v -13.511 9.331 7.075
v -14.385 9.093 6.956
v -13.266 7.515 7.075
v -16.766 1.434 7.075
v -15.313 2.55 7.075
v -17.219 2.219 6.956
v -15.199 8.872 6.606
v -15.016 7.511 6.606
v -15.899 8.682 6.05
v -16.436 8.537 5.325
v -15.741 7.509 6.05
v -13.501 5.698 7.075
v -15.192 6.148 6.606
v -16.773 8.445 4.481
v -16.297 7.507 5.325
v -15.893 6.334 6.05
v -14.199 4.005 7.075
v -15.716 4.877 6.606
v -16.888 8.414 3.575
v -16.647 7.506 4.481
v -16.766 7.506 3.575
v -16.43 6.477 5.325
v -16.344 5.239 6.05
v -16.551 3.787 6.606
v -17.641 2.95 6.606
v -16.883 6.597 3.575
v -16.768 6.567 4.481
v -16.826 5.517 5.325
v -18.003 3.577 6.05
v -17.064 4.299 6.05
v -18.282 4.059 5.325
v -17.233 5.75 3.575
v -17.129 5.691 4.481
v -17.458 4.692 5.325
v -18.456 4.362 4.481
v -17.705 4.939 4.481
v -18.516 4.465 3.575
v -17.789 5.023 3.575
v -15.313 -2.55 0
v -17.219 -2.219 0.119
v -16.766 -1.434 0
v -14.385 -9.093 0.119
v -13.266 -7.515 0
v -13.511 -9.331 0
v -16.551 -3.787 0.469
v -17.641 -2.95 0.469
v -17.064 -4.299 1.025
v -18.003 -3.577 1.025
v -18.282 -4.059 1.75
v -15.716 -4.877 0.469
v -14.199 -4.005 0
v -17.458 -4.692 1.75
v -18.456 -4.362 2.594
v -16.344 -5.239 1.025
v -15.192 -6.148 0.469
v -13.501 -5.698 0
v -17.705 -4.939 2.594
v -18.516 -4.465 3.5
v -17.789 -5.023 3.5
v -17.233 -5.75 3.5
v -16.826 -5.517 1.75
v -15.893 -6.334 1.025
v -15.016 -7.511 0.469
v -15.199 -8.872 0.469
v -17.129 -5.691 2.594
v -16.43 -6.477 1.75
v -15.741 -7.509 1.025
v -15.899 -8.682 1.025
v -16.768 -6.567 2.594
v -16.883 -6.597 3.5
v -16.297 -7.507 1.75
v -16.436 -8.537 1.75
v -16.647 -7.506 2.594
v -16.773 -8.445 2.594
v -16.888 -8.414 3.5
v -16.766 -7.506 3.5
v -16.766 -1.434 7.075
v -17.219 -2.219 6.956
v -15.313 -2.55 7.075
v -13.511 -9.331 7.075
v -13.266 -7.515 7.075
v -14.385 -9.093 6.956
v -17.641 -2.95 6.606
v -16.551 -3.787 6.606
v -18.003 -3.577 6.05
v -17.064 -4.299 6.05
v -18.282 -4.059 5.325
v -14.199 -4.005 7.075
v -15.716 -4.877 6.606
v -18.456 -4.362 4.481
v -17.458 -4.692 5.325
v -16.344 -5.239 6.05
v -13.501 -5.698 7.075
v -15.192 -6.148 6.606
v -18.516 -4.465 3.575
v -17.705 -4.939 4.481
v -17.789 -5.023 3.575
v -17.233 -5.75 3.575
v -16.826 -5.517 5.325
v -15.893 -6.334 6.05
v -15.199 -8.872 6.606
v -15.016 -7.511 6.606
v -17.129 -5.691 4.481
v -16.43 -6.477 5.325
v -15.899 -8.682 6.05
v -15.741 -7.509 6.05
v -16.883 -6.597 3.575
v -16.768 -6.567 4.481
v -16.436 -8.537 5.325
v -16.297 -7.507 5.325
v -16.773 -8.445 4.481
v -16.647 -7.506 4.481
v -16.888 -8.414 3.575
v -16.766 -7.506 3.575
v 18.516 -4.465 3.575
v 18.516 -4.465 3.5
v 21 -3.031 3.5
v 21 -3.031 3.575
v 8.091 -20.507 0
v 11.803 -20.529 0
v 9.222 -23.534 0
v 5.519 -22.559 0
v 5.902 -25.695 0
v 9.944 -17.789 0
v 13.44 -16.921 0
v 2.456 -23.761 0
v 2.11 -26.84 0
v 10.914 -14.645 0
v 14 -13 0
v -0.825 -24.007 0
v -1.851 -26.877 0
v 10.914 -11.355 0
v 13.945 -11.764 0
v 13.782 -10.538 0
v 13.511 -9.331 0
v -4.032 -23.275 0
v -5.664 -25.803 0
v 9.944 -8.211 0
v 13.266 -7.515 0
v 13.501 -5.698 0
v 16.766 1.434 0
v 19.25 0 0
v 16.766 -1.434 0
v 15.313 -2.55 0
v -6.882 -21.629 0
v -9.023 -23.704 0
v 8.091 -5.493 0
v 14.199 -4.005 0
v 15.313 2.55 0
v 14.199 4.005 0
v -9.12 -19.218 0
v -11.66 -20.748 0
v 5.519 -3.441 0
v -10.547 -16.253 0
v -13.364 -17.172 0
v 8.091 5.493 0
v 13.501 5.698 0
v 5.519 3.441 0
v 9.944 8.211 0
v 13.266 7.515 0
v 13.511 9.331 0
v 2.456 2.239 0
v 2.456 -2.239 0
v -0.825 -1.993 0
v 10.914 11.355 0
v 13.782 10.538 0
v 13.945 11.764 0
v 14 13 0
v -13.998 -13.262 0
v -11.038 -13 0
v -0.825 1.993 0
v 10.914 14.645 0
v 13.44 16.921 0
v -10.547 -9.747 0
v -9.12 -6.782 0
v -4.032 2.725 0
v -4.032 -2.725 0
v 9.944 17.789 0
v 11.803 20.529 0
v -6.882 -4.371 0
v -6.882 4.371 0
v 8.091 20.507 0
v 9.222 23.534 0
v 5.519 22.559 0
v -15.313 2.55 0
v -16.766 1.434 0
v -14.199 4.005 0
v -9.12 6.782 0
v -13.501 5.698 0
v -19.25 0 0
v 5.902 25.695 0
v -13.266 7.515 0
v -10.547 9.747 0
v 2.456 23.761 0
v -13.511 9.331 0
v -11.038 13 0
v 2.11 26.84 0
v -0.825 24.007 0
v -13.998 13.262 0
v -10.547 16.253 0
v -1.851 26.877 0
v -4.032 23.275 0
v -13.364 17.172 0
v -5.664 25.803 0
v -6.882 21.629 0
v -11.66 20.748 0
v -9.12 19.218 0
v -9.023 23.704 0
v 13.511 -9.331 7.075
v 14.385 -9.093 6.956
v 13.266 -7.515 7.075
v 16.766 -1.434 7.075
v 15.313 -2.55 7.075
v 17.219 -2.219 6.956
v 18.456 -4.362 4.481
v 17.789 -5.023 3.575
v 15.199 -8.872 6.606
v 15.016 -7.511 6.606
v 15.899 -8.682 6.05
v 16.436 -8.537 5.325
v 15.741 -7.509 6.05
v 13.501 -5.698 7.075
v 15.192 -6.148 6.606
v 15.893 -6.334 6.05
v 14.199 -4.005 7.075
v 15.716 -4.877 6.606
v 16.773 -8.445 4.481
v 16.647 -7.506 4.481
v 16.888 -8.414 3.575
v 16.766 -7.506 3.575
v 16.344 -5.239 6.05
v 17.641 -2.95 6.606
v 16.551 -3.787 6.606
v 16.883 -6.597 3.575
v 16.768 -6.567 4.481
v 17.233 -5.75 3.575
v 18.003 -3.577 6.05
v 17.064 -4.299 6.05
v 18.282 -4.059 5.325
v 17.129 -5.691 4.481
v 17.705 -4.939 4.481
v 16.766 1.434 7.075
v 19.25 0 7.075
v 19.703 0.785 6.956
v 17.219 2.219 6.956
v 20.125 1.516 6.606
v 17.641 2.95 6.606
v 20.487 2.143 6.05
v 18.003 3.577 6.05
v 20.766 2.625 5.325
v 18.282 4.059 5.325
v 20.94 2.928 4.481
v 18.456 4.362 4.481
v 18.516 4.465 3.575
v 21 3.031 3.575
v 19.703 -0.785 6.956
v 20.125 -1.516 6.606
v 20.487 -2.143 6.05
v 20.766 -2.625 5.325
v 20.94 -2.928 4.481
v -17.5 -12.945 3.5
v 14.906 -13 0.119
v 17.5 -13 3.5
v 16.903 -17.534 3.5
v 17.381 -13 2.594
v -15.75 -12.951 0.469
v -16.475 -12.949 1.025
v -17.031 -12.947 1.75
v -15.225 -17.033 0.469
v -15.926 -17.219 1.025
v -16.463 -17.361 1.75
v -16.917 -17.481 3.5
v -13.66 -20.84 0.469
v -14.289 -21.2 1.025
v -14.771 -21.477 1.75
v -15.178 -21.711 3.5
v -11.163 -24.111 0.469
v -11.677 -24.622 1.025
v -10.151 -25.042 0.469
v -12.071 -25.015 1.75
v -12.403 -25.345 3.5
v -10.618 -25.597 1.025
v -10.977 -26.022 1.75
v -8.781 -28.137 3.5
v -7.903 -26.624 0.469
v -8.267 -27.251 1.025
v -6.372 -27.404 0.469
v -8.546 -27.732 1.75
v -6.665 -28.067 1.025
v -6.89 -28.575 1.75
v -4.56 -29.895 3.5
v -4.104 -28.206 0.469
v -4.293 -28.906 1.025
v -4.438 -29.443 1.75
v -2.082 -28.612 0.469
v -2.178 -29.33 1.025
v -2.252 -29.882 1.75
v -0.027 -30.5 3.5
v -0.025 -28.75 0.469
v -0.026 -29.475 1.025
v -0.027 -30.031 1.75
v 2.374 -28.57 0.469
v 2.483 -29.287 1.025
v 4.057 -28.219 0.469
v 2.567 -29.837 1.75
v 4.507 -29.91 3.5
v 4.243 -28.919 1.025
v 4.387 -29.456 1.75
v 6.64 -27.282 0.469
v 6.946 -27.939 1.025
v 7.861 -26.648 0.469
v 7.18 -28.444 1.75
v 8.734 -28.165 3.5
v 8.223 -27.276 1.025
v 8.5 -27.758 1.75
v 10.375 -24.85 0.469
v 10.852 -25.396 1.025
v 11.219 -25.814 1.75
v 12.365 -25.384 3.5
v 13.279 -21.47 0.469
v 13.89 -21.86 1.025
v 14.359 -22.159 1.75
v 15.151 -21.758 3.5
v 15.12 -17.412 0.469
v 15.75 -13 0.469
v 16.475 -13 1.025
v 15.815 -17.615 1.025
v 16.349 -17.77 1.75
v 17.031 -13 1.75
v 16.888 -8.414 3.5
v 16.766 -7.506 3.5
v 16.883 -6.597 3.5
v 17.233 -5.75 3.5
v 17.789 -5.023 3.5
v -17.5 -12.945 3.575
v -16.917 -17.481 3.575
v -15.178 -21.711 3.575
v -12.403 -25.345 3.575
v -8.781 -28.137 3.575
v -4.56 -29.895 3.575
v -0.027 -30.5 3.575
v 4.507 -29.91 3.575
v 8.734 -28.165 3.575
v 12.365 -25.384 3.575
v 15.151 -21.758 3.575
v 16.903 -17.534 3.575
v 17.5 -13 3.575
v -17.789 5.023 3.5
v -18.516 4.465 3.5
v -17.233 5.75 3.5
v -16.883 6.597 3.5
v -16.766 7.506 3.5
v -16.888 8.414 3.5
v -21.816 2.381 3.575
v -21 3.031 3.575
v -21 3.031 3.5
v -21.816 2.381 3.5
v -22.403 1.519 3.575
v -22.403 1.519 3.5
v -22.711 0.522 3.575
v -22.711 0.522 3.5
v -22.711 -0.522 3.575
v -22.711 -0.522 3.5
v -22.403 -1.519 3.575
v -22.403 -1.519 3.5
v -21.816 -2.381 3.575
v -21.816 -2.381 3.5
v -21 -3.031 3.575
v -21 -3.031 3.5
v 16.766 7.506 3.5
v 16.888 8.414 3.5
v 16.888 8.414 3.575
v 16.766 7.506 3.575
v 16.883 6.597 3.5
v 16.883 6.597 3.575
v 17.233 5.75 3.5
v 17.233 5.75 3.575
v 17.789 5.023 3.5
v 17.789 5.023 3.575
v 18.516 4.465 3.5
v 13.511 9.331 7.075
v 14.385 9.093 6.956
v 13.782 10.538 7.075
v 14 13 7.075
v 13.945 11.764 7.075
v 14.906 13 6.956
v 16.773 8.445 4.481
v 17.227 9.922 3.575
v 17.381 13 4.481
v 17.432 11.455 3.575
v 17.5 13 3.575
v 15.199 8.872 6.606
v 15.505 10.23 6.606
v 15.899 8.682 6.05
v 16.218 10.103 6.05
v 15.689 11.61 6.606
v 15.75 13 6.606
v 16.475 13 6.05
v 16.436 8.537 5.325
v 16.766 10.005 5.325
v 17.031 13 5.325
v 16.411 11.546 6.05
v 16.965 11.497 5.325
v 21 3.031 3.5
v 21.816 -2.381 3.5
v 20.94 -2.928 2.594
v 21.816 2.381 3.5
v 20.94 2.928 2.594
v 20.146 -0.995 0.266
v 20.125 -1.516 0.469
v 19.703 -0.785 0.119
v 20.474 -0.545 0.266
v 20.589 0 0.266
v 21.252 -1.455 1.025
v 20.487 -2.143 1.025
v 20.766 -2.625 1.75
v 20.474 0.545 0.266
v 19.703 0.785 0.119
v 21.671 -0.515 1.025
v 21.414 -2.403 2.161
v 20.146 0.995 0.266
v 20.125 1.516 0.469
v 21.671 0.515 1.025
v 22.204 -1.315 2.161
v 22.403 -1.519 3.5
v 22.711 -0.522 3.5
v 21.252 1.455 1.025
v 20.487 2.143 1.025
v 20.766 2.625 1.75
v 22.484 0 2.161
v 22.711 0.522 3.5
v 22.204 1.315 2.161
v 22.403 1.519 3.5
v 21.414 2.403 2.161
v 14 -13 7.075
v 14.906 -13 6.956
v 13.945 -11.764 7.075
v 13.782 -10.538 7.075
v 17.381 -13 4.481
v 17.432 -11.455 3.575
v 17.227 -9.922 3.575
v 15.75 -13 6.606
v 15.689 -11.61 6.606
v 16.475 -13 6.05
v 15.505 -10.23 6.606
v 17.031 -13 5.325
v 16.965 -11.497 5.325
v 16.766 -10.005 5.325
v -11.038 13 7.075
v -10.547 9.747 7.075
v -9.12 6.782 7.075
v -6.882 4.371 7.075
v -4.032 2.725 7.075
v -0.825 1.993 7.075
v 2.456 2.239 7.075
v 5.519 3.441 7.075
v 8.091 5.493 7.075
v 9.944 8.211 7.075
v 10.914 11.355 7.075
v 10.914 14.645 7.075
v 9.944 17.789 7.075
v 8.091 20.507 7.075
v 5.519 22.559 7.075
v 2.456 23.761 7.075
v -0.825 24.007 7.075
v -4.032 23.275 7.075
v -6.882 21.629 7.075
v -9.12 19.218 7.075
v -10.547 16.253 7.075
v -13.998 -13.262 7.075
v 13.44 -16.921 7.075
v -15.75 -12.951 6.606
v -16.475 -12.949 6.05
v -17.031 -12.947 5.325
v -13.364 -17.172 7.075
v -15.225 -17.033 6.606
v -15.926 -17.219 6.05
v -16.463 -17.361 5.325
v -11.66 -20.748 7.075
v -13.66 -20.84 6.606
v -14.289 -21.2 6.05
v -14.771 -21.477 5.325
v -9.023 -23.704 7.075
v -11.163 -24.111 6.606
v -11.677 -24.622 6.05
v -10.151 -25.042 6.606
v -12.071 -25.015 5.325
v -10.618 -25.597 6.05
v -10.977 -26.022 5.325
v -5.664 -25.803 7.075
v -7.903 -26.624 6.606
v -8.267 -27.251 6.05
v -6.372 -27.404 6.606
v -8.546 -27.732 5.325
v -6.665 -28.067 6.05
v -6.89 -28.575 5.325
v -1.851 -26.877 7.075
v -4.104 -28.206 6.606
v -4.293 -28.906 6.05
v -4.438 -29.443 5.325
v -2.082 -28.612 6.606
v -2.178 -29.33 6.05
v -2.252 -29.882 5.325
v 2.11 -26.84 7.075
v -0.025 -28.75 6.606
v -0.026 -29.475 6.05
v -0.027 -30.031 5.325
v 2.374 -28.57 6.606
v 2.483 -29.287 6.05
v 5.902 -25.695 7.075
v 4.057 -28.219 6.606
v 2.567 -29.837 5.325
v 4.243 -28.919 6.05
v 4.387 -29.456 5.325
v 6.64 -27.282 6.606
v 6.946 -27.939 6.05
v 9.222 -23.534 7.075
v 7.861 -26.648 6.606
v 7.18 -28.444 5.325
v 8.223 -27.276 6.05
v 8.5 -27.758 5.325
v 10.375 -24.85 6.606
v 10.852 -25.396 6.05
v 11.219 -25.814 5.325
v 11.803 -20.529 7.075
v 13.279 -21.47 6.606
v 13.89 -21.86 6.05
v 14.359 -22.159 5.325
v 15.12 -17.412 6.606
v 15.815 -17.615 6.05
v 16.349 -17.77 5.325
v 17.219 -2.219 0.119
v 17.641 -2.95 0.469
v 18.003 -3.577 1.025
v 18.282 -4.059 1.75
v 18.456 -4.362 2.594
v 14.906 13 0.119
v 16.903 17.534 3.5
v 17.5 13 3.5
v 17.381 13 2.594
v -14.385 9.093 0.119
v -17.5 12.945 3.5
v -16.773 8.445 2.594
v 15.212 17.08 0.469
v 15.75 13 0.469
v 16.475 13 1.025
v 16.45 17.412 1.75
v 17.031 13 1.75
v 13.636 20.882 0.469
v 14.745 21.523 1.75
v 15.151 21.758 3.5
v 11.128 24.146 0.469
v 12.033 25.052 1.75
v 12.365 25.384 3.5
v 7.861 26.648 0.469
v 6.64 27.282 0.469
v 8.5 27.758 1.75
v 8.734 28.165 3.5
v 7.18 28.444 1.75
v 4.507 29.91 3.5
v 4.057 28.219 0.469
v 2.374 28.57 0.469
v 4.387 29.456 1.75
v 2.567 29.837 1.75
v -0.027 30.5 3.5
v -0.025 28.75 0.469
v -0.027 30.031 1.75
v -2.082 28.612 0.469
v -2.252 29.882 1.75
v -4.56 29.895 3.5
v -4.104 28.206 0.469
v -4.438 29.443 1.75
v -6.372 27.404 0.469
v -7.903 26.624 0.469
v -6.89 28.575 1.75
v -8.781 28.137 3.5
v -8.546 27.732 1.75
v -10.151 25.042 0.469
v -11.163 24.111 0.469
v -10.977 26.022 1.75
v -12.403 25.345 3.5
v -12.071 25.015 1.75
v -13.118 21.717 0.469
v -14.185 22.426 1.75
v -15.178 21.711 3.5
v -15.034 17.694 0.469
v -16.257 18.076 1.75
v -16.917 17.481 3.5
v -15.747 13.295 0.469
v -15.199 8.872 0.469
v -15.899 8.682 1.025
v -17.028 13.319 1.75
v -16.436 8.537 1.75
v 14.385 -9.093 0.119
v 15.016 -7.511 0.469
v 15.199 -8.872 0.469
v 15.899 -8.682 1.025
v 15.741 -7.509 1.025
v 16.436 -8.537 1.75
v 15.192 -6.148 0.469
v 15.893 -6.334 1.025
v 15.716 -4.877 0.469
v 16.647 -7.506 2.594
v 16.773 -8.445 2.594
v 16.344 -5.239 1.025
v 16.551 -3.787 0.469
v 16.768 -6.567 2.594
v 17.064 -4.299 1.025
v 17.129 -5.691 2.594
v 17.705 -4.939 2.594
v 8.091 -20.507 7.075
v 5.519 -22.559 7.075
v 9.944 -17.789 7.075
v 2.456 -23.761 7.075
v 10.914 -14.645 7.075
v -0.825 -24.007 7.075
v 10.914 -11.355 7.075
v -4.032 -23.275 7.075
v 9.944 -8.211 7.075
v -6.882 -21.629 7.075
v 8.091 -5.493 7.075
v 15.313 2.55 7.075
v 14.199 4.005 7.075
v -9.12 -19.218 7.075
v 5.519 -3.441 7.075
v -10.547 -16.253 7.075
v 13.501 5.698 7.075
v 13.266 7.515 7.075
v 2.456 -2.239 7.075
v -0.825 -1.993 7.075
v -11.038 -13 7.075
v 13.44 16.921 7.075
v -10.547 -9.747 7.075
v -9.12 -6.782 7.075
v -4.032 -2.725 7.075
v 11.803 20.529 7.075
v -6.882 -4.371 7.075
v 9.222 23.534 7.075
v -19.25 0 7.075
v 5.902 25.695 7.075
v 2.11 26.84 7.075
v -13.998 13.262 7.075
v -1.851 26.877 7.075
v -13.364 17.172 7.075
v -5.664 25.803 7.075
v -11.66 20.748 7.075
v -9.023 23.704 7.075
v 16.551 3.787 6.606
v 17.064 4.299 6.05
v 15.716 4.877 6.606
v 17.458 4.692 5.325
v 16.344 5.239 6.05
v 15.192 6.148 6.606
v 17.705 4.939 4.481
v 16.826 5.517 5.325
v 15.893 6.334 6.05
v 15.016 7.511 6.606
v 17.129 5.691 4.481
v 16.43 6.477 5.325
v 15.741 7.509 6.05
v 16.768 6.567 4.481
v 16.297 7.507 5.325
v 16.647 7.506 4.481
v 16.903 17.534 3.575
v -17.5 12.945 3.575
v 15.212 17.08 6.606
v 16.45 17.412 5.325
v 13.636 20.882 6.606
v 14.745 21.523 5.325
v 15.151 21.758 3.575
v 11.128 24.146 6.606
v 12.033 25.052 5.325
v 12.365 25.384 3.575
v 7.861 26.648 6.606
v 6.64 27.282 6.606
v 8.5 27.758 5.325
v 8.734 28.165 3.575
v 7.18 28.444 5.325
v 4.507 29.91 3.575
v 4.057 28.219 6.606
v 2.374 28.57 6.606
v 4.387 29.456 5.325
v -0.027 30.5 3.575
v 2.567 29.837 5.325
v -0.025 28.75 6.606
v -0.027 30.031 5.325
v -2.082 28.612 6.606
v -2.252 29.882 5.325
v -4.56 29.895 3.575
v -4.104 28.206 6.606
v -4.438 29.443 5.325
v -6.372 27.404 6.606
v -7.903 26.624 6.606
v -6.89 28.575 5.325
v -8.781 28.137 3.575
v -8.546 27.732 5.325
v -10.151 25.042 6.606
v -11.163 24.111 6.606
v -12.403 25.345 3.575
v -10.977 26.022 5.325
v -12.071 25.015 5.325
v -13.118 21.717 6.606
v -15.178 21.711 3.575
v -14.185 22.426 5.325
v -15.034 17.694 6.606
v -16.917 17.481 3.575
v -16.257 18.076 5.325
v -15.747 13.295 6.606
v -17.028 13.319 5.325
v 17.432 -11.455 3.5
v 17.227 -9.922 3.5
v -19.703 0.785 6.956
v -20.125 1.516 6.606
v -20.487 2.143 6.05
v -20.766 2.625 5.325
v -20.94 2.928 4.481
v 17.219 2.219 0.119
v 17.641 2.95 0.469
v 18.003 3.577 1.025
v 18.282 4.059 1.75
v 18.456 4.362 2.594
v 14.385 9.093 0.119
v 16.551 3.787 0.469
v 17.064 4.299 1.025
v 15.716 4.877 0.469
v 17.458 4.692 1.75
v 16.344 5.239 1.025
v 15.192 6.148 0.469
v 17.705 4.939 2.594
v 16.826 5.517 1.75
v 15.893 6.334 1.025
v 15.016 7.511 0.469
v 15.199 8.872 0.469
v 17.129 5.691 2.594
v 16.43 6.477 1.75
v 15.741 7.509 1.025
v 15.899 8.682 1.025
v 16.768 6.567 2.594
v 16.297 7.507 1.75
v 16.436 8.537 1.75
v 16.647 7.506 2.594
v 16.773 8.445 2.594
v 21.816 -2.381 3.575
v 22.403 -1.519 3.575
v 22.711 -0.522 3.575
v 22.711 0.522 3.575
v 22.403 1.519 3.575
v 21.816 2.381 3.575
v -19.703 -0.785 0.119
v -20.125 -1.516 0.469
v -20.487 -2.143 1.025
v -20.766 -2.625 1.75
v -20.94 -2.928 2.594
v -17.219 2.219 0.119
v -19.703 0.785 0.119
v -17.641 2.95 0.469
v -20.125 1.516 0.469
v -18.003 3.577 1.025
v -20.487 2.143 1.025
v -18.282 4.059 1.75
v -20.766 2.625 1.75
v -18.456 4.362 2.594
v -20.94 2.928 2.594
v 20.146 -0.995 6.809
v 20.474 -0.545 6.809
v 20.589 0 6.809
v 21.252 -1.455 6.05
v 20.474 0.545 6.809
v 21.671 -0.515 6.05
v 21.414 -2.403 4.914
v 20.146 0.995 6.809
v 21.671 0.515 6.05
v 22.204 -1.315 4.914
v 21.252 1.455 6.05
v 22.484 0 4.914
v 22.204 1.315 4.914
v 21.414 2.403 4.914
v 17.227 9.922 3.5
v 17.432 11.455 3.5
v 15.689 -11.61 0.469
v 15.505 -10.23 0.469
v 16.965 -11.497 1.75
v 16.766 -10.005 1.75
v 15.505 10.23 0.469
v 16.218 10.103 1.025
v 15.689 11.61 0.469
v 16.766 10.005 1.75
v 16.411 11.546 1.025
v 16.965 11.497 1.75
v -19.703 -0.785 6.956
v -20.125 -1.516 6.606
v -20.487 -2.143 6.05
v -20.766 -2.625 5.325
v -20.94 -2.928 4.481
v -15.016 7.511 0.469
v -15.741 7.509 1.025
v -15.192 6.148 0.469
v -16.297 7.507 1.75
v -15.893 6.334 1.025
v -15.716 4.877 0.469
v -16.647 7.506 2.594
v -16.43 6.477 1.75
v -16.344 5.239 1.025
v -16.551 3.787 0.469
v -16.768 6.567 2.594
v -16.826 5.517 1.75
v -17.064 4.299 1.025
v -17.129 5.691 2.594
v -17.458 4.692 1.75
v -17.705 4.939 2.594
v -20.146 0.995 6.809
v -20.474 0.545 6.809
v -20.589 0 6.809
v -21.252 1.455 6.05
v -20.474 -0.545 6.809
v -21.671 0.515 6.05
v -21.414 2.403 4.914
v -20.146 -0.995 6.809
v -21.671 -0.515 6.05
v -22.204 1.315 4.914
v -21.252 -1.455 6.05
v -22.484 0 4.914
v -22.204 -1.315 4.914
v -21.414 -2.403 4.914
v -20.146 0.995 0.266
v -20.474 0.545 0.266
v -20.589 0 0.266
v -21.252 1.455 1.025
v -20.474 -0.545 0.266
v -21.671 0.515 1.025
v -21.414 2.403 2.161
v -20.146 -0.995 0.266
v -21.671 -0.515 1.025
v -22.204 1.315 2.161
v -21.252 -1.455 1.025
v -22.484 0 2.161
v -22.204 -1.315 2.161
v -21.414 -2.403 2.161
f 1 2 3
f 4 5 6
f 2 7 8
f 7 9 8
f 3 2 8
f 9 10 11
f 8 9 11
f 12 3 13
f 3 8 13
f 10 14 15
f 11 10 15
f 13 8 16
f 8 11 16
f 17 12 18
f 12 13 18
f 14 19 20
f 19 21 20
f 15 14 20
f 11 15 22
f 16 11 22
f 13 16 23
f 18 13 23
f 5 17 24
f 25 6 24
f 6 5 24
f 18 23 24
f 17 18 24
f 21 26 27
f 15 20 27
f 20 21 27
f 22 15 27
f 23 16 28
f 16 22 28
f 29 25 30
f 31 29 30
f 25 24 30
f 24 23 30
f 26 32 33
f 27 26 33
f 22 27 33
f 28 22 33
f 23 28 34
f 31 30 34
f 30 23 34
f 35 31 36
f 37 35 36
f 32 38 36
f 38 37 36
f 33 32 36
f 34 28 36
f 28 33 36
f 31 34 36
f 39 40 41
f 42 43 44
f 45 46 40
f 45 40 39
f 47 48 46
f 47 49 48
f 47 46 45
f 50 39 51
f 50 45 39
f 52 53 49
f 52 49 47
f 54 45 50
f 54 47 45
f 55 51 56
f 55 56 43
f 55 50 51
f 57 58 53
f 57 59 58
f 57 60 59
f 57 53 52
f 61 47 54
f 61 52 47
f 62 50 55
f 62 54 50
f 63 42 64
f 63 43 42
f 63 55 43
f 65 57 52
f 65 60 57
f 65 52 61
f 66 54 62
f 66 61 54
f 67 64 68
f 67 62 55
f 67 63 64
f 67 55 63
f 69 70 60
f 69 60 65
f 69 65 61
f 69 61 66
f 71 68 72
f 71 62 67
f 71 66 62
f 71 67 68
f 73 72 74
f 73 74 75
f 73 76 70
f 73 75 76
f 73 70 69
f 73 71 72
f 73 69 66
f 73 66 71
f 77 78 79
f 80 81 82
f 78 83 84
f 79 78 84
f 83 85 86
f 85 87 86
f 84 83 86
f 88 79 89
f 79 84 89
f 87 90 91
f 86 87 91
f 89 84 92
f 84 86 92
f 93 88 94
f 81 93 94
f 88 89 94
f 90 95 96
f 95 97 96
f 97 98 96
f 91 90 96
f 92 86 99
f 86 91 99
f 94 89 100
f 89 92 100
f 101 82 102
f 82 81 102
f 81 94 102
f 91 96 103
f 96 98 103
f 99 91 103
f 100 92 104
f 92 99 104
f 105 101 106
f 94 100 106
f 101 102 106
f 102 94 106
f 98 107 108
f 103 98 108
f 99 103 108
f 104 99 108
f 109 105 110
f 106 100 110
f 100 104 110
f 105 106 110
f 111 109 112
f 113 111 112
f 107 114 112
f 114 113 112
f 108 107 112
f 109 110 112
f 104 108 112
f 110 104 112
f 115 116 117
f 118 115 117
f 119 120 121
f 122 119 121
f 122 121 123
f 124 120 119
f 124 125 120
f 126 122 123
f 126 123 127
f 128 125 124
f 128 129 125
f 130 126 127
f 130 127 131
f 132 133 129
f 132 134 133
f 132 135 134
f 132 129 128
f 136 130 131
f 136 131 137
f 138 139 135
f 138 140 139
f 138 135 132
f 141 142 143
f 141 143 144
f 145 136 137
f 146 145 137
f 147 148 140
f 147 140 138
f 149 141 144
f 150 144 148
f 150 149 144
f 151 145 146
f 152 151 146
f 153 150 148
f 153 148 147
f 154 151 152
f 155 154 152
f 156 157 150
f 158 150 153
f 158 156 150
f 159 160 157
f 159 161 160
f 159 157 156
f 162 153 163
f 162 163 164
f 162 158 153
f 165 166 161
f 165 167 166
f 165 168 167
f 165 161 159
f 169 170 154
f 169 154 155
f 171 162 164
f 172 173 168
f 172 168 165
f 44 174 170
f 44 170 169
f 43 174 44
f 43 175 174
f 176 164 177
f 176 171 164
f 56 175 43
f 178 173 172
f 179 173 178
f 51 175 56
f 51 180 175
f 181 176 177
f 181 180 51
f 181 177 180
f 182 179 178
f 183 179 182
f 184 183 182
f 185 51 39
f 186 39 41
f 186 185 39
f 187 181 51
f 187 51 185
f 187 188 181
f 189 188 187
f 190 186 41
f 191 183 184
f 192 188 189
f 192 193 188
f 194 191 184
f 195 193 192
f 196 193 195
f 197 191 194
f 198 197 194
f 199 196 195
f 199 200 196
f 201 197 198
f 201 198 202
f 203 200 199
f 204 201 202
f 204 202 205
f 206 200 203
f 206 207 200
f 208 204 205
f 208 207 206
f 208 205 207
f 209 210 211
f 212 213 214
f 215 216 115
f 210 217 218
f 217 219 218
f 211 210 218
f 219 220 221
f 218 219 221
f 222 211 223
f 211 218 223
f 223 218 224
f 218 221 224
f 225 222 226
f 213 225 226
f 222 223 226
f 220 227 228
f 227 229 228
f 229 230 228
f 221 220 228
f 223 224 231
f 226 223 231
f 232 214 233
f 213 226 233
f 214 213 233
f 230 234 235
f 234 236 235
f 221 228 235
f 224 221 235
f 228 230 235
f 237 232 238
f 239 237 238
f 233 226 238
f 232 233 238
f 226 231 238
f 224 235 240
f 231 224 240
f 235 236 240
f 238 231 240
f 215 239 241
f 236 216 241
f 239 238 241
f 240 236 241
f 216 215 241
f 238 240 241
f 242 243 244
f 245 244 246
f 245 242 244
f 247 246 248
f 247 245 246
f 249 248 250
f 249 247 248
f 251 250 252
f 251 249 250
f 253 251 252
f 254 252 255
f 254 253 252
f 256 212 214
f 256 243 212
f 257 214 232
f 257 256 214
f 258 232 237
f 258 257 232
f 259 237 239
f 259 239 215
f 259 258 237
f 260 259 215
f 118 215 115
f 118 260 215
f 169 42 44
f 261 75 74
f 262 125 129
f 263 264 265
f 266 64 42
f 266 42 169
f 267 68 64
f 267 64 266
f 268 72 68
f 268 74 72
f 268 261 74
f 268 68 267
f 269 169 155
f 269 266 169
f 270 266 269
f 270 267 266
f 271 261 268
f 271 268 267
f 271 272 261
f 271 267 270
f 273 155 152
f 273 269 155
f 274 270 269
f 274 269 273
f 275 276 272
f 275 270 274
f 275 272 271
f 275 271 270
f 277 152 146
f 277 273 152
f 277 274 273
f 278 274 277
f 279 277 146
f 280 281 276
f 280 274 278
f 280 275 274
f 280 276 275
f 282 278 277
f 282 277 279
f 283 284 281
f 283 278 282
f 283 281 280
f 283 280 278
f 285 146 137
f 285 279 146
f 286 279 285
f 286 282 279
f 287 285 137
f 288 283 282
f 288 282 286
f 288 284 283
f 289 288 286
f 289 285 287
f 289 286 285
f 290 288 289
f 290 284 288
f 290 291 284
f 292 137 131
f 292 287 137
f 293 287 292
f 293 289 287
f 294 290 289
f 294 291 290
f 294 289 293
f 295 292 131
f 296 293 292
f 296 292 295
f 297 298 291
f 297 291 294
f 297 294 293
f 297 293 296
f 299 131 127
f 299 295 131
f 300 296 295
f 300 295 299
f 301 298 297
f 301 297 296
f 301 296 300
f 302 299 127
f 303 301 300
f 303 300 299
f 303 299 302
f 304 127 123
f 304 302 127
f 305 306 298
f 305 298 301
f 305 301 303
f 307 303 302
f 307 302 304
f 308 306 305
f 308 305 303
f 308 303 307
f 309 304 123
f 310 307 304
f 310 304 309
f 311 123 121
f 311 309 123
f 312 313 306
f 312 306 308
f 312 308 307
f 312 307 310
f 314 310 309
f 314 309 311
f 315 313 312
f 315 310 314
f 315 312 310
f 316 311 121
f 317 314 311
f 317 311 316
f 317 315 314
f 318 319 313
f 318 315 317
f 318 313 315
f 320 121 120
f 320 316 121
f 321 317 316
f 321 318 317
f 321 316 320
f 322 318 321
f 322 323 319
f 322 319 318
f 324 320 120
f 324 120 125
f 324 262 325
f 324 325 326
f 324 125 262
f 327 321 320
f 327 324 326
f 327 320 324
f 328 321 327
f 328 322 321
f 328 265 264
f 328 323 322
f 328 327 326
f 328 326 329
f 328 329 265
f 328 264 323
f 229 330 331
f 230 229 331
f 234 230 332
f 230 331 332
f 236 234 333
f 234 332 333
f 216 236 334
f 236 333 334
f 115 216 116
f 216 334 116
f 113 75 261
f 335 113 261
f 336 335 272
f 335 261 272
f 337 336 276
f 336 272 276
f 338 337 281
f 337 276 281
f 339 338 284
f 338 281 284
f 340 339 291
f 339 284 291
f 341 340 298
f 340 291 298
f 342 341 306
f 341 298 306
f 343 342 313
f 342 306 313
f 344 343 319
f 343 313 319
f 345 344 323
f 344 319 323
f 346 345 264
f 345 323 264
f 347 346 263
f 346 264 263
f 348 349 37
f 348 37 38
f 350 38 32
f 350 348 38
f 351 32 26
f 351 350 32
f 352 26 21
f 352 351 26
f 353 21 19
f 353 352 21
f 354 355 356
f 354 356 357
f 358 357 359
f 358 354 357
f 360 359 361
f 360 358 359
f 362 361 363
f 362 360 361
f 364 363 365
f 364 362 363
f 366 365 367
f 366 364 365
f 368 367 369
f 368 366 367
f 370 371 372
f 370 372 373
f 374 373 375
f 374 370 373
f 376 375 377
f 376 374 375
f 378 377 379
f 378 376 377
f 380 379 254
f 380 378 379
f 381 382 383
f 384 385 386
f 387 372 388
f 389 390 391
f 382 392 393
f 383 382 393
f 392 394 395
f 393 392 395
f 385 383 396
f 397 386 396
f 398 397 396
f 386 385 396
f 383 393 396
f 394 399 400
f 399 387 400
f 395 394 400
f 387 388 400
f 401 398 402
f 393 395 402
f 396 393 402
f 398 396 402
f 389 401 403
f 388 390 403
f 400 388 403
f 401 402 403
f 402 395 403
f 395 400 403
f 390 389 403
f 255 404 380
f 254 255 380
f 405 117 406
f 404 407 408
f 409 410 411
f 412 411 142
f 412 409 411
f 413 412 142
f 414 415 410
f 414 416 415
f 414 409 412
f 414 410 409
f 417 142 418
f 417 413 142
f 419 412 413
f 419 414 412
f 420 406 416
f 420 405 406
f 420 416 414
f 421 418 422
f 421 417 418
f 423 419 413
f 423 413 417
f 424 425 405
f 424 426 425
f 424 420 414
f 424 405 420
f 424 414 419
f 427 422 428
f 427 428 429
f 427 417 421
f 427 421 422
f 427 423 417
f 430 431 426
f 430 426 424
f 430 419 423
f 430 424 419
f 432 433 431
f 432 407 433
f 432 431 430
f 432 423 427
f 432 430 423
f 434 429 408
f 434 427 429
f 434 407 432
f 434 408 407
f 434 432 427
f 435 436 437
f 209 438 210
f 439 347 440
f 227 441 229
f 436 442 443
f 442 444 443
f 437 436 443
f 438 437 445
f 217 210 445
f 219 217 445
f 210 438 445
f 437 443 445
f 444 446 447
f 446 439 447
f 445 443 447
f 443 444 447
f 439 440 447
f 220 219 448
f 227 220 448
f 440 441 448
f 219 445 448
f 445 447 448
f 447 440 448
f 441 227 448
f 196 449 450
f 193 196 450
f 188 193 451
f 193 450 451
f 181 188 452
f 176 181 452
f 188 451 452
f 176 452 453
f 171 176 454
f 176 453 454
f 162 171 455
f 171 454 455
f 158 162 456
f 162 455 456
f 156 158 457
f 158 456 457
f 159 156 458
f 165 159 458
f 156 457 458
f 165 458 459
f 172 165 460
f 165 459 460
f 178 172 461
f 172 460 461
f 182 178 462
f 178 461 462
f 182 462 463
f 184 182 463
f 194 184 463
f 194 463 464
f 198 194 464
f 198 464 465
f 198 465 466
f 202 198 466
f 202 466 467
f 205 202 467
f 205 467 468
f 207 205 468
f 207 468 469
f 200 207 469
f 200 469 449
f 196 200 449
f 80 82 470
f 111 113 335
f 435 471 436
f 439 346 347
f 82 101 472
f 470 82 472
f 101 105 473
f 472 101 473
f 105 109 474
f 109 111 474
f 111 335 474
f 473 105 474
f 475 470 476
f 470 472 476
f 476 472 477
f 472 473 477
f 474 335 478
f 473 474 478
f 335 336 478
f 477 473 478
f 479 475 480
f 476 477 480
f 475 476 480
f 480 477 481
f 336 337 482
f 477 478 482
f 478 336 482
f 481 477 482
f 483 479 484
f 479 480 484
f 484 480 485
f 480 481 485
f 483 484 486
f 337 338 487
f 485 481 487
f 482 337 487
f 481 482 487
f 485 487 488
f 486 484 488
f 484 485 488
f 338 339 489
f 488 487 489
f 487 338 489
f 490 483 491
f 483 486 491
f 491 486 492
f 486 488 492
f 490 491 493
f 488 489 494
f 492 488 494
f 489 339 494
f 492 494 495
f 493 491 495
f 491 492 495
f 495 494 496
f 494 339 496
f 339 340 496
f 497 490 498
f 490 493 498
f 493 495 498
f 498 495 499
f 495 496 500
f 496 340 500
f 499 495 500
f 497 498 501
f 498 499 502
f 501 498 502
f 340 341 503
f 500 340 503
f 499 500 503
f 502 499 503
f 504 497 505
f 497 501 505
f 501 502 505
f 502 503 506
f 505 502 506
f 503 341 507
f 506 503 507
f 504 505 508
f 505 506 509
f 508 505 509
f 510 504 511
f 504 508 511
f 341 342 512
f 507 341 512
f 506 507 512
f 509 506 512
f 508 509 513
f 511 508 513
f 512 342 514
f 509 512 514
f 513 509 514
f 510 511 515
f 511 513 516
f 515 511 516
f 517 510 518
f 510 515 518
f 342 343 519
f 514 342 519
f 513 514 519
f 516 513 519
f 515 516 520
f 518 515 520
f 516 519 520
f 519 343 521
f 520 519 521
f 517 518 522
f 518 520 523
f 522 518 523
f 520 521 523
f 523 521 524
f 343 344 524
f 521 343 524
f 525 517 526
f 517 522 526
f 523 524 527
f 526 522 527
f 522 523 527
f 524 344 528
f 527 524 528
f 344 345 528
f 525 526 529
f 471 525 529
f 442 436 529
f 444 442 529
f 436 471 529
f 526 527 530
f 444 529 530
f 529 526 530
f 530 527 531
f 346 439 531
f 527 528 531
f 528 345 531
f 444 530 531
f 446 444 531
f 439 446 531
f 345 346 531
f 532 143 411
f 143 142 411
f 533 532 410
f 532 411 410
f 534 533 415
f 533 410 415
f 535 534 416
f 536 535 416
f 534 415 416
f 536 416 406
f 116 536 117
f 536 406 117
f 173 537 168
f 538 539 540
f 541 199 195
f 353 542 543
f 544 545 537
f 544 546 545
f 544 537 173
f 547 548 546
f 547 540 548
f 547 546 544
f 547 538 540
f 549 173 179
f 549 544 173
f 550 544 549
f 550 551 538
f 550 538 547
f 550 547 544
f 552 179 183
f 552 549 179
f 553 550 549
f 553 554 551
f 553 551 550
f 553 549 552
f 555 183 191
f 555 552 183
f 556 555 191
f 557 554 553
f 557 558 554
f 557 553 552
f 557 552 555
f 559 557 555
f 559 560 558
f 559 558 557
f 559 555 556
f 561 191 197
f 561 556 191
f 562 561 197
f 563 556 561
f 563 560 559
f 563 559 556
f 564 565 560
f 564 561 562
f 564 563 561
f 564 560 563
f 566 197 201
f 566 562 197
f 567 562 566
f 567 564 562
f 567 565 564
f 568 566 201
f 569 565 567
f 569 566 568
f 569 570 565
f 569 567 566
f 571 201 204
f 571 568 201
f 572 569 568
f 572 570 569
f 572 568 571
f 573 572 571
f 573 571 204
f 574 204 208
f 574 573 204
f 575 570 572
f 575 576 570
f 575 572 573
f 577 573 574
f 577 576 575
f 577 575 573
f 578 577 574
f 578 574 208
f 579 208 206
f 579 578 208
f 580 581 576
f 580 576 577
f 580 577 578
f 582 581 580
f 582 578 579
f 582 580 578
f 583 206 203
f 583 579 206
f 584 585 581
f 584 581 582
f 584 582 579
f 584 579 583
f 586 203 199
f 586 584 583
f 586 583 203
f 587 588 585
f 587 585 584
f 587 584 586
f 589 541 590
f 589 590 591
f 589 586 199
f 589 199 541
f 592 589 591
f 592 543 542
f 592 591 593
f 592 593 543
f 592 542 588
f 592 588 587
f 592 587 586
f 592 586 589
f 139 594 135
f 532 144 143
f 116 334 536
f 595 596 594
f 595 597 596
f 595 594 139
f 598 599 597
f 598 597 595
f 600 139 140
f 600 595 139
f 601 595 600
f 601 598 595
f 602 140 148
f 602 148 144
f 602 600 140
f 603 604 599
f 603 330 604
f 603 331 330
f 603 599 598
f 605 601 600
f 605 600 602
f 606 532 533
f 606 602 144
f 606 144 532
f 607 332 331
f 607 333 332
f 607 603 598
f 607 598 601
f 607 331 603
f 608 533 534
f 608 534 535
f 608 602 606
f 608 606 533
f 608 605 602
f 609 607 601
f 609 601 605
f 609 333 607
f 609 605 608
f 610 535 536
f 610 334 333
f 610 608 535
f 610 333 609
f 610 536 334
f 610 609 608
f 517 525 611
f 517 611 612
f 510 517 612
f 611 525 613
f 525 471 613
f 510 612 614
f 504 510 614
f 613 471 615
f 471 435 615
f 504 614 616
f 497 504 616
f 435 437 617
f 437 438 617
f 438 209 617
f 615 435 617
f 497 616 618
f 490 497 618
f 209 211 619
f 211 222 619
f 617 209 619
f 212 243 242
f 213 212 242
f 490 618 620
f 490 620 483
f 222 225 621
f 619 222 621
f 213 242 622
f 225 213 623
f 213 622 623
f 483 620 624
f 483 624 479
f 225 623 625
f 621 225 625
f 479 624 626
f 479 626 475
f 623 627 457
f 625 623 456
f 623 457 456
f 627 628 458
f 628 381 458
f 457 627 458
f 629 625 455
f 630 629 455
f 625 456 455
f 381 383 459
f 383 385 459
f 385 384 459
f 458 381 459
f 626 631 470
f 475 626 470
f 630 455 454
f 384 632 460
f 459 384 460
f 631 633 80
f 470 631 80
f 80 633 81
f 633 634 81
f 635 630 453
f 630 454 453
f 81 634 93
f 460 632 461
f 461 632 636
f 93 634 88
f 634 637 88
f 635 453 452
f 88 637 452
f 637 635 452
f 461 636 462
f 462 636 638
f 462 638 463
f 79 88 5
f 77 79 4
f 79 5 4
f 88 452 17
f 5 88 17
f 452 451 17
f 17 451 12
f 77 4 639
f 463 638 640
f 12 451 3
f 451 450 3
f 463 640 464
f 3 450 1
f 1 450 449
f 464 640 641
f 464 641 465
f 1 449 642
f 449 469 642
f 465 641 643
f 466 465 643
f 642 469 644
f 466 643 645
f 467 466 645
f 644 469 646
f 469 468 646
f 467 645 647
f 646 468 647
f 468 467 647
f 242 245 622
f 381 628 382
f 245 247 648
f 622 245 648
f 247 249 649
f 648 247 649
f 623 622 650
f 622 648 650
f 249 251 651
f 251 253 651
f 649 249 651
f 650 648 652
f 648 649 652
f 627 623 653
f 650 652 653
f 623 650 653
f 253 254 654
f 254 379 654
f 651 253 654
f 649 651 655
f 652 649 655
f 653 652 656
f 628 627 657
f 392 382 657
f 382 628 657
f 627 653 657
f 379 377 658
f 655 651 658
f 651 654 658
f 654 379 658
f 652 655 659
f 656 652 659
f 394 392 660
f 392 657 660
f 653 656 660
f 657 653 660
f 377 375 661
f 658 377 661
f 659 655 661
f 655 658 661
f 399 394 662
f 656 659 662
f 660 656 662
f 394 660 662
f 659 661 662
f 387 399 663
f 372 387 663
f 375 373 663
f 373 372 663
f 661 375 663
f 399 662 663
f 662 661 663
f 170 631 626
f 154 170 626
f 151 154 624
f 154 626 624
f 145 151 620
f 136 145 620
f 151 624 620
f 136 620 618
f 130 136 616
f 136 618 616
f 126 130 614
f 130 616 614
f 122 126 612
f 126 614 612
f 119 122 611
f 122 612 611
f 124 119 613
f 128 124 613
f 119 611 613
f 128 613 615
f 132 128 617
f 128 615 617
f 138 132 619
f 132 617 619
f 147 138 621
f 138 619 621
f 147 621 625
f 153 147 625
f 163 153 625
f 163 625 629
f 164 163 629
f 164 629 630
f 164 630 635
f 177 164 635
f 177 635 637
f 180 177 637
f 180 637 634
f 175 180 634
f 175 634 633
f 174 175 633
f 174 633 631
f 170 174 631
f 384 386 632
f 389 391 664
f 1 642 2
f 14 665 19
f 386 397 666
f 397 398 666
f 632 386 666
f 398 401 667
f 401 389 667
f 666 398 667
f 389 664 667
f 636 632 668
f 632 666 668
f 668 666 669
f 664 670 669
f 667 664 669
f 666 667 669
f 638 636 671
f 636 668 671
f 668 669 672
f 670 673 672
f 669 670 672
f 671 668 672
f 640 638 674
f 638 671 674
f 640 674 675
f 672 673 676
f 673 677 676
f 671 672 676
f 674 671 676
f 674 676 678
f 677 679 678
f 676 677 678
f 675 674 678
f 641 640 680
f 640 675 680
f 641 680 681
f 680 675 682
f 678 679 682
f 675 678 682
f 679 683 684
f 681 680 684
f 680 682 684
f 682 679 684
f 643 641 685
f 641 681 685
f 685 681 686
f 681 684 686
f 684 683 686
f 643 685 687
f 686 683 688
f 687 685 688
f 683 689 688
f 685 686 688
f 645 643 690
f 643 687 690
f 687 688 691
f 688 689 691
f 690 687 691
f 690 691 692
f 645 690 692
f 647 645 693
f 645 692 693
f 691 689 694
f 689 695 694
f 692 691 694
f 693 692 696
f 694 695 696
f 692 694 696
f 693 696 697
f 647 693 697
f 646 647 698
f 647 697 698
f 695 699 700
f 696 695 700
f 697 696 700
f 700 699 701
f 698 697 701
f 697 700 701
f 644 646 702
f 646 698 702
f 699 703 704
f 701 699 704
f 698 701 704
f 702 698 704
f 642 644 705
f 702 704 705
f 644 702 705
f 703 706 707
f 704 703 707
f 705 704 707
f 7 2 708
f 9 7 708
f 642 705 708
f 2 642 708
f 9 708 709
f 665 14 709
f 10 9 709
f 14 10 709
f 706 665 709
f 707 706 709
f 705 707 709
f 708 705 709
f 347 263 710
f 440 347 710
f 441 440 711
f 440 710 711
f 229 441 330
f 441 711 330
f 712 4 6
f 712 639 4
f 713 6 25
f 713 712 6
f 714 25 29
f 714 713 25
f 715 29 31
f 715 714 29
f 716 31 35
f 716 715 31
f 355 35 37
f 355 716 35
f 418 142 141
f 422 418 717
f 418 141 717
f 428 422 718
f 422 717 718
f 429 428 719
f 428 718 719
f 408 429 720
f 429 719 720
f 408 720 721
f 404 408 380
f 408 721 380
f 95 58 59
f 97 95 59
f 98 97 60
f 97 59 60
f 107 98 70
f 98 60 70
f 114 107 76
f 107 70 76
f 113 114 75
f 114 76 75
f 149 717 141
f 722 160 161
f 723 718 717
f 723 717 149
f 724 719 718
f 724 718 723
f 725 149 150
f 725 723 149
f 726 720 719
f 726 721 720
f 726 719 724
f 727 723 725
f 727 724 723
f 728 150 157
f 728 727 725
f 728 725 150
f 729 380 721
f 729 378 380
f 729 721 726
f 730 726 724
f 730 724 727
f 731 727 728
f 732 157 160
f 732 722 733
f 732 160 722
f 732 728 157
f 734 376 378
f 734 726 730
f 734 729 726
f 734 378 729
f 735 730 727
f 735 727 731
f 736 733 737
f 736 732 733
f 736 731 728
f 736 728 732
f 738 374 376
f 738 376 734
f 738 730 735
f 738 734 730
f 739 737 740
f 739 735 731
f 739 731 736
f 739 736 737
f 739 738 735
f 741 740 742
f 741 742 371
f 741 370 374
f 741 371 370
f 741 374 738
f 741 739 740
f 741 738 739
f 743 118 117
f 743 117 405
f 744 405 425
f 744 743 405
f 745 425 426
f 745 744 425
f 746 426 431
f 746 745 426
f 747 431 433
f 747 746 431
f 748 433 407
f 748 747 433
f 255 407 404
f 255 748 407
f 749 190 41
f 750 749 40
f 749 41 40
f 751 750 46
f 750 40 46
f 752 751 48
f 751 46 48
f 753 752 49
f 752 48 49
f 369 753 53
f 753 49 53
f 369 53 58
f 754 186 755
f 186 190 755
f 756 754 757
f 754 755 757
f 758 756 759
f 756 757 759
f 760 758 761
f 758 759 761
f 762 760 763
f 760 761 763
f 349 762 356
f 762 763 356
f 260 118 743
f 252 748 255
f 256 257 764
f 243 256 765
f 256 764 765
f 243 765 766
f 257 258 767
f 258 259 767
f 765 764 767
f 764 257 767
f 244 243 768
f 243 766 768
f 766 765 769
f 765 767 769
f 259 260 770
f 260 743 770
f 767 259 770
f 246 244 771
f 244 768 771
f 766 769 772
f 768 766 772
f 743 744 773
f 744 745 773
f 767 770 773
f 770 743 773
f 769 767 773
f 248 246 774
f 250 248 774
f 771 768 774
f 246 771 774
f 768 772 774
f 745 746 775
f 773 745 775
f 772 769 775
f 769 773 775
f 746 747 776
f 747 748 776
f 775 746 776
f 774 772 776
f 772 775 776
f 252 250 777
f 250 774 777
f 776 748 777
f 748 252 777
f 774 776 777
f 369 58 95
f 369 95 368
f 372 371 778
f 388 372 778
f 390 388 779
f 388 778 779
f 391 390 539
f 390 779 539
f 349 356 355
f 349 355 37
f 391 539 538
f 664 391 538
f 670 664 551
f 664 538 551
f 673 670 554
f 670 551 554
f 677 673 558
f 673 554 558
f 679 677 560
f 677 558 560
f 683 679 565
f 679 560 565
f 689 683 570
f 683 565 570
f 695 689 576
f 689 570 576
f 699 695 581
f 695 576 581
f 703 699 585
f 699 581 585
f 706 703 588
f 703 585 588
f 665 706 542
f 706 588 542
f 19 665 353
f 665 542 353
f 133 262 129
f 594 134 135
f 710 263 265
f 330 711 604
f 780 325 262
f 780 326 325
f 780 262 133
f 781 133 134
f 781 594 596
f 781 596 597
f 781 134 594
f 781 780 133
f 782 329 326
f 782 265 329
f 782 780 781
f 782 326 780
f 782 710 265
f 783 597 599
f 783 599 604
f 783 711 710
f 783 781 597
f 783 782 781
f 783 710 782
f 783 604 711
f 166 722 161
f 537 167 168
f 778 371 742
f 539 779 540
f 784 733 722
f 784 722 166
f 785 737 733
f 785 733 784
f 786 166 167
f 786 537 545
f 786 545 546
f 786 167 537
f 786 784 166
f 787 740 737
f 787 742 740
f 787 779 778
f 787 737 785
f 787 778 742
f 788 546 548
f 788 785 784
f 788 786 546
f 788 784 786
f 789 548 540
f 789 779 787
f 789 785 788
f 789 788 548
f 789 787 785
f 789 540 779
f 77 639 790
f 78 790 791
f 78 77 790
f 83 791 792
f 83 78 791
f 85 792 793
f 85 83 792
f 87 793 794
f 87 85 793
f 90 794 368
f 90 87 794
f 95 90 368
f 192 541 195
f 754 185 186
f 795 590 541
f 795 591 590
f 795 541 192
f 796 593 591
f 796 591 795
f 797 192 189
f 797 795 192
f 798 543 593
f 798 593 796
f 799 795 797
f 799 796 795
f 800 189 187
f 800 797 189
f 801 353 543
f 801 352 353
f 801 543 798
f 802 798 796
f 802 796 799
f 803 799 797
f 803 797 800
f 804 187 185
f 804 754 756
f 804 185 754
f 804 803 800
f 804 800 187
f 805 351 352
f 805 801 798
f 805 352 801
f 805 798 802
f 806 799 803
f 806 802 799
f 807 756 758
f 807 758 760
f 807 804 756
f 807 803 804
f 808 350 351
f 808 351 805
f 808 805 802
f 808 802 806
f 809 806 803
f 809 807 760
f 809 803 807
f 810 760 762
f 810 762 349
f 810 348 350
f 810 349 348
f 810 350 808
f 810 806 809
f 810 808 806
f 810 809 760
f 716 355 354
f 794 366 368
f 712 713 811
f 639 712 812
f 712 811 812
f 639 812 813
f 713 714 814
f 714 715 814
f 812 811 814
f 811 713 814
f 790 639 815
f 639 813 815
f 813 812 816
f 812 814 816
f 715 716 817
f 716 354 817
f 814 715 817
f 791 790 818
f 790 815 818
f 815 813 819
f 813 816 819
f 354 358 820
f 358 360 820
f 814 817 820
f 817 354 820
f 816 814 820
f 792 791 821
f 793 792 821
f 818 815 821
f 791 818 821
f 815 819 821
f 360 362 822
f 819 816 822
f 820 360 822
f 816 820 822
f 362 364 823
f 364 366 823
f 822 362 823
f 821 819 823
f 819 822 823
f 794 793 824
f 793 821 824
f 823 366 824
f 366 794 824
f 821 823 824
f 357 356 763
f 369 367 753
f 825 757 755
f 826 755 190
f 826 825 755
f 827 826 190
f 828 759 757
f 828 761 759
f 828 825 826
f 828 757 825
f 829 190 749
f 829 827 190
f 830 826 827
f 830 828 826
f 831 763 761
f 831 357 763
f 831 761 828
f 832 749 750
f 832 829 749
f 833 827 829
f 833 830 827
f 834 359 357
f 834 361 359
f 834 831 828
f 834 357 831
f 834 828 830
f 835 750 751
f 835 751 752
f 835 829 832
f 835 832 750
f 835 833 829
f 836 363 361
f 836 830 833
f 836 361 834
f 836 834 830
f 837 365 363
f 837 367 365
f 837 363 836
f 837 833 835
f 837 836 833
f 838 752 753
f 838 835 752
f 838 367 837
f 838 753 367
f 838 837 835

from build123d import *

# Parameters (mm, degrees)
F1_DEPTH = 7.075
F3_DEPTH = 7.075
F4_D     = 22.075
F4_DEPTH = 35.375
F4_TIP   = 6.6319990825
F5_F1_R  = 3.5
F5_F2_R  = 3.5
F5_F3_R  = 3.5


# Not quite as in the source:
# - a pattern or mirror of a feature is missing from the dataset's text; its kind, count and spacing are read off the source's solid


with BuildPart() as f1:
    # F0 (on Top) → F1 (new body)
    with BuildSketch(Plane.XY):
        with BuildLine():
            ThreePointArc((11.7153745139, 0), (15.9885748895, 5.8855447852), (17.5, 13))
            ThreePointArc((17.5, 13), (-7.1144552148, 28.9885748895), (-11.7153745139, 0))
            ThreePointArc((-11.7153745139, 0), (0, 4.5), (11.7153745139, 0))
        make_face()
        with BuildLine():
            ThreePointArc((11.7153745139, 0), (0, -4.5), (-11.7153745139, 0))
            ThreePointArc((-11.7153745139, 0), (-7.1144552148, -28.9885748895), (17.5, -13))
            ThreePointArc((17.5, -13), (15.9885748895, -5.8855447852), (11.7153745139, 0))
        make_face()
        with BuildLine():
            ThreePointArc((11.7153745139, 0), (0, 4.5), (-11.7153745139, 0))
            ThreePointArc((-11.7153745139, 0), (0, -4.5), (11.7153745139, 0))
        make_face()
    extrude(amount=F1_DEPTH)

    # F2 (on Top) → F3 (join)
    with BuildSketch(Plane.XY):
        Polygon((26.25, 0), (0, 15.1554445662), (0, -15.1554445662), align=None)
    f3 = extrude(amount=F3_DEPTH)

    # F3_copies: F3 across plane
    add(f3.mirror(Plane(origin=(0, 0, 0), x_dir=(0, 0, -1), z_dir=(-1, 0, 0))))

    # F4
    with Locations(Plane(origin=(0, 0, 0), x_dir=(1, 0, 0), z_dir=(0, 0, -1))):
        with Locations((0, -13), (0, 13)):
            Hole(F4_D / 2, depth=F4_DEPTH)
            with Locations((0, 0, -(F4_DEPTH + F4_TIP / 2))):  # 118° drill point
                Cone(0, F4_D / 2, F4_TIP, mode=Mode.SUBTRACT)

    # F5: fillet of radius 3.5 on 14 edges, made by hand

    # F5_f1
    f5_f1_edges = [f1.edges().sort_by_distance(p)[0] for p in [
        (16.0023148685, -5.9165037693, 3.5375),
        (-16.0023148685, 5.9165037693, 3.5375),
        (16.0023148685, 5.9165037693, 3.5375),
        (-16.0023148685, -5.9165037693, 3.5375),
    ]]
    fillet(f5_f1_edges, radius=F5_F1_R)

    # F5_f2
    f5_f2_edges = [f1.edges().sort_by_distance(p)[0] for p in [
        (26.25, 0, 3.5375),
        (-26.25, 0, 3.5375),
    ]]
    fillet(f5_f2_edges, radius=F5_F2_R)

    # F5_f3
    f5_f3_edges = [f1.edges().sort_by_distance(p)[0] for p in [
        (19.7579861931, -3.748165919, 0),
        (19.7579861931, -3.748165919, 7.075),
        (0, 30.5, 0),
        (0, 30.5, 7.075),
        (0, -30.5, 0),
        (0, -30.5, 7.075),
        (19.7579861931, 3.748165919, 0),
        (19.7579861931, 3.748165919, 7.075),
        (22.75, 0, 7.075),
        (17.03013711, 6.1624015307, 7.075),
        (22.75, 0, 0),
        (17.03013711, 6.1624015307, 0),
        (-17.03013711, -6.1624015307, 7.075),
        (17.03013711, -6.1624015307, 7.075),
        (-17.03013711, -6.1624015307, 0),
        (17.03013711, -6.1624015307, 0),
        (-17.03013711, 6.1624015307, 7.075),
        (-17.03013711, 6.1624015307, 0),
    ]]
    fillet(f5_f3_edges, radius=F5_F3_R)


solid = f1.part
